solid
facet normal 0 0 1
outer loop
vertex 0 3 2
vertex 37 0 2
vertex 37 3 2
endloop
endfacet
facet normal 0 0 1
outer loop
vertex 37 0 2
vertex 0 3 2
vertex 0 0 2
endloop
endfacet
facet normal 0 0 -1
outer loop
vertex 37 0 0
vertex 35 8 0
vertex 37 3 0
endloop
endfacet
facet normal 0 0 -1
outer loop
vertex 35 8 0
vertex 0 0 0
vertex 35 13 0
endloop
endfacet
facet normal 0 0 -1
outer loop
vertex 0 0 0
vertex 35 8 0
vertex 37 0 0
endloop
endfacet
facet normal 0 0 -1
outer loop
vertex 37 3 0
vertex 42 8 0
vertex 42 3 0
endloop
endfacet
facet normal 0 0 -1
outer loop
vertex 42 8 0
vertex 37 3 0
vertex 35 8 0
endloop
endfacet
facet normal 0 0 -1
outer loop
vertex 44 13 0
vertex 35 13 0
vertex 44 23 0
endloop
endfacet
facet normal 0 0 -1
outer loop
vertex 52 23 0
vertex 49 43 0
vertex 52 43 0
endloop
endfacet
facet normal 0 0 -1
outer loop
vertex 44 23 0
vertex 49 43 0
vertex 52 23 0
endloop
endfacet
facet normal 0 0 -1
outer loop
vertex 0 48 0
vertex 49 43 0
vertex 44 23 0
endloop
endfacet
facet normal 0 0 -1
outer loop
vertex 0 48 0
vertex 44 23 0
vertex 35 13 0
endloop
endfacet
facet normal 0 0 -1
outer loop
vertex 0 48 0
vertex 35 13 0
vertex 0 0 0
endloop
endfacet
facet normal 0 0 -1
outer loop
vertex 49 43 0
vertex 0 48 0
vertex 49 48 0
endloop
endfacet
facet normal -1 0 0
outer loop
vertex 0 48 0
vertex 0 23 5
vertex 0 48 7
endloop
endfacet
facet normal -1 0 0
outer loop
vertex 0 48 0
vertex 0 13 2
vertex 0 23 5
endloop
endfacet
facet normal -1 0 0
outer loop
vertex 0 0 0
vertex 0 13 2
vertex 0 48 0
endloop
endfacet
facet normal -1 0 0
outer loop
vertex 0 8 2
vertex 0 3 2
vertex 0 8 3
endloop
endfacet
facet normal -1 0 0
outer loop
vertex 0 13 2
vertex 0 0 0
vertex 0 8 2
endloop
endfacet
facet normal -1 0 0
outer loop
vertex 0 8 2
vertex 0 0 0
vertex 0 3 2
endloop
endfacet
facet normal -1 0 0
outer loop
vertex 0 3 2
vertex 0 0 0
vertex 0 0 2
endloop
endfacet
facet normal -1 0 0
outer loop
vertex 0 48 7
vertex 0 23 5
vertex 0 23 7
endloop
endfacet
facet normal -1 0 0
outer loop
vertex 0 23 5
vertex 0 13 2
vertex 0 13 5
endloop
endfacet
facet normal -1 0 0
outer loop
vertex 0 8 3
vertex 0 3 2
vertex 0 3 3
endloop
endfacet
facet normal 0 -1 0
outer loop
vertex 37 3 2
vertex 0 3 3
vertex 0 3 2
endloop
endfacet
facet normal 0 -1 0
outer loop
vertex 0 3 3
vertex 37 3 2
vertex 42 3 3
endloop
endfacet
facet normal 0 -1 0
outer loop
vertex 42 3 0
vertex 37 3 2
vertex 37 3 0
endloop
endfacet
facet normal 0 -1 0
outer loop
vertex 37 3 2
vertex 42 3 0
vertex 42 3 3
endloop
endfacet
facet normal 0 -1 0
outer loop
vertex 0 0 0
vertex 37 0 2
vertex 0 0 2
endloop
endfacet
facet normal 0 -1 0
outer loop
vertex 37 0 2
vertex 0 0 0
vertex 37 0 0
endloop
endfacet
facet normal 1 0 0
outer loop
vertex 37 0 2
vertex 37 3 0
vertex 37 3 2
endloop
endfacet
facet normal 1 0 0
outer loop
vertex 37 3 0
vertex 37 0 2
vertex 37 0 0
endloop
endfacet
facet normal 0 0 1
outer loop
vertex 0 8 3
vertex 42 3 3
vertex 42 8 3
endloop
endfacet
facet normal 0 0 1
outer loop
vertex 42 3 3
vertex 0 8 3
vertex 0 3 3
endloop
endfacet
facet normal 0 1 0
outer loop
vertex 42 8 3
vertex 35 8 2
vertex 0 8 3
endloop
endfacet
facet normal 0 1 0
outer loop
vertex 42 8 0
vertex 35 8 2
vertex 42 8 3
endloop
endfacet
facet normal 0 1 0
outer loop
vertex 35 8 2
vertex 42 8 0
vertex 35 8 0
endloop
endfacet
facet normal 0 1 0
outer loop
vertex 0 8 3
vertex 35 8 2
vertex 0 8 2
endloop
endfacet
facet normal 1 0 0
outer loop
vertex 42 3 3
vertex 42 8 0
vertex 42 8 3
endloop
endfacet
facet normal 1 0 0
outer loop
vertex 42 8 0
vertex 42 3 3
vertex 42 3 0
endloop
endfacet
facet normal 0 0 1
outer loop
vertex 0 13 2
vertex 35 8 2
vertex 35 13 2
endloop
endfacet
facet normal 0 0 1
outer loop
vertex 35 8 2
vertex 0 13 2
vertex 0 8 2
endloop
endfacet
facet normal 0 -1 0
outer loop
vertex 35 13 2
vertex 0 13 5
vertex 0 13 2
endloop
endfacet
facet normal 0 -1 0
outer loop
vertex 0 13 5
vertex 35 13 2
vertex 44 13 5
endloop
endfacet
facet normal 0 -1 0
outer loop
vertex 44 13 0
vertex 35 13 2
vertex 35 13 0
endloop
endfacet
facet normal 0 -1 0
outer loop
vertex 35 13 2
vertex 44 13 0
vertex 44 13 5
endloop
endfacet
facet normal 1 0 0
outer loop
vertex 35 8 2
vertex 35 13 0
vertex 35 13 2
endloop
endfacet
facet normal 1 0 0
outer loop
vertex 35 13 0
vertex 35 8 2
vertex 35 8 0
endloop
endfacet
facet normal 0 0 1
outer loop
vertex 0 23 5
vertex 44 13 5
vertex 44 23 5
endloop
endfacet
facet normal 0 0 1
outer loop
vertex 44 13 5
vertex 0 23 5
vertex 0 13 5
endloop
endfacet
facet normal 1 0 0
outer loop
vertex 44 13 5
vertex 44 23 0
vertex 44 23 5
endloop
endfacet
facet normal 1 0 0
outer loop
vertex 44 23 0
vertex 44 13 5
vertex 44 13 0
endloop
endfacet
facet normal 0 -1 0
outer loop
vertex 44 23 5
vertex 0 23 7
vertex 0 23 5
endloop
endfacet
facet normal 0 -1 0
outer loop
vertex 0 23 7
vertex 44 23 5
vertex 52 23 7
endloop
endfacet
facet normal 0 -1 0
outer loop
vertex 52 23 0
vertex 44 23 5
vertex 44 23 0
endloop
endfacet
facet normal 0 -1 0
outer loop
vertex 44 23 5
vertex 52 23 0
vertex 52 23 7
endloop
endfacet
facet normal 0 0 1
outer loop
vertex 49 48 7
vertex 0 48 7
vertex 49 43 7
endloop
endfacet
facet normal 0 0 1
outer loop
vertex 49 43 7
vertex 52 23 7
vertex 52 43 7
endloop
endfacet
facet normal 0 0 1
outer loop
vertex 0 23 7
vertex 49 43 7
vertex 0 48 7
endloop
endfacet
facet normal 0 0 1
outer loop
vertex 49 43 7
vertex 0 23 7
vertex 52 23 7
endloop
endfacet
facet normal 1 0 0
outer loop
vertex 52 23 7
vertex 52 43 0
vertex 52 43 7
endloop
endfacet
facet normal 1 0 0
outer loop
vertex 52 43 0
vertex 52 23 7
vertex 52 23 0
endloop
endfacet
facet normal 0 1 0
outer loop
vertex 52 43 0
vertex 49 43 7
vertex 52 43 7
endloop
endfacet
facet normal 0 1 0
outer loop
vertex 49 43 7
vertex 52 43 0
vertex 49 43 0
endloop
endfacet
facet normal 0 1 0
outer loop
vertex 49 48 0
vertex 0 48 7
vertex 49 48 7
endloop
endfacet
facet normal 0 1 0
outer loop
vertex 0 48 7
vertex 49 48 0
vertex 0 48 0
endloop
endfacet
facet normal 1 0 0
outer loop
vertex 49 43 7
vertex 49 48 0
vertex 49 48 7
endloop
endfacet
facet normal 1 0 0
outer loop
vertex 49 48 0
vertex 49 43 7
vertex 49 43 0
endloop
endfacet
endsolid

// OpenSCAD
translate([2.5, 1.5, 1.0]) color([0.9694854220936419, 0.7136168898793864, 0.2963863893491513]) cube([5, 3, 2], center=true);
translate([8.5, 1.5, 1.0]) color([0.8491315553121948, 0.95846907728749, 0.38764569013819994]) cube([7, 3, 2], center=true);
translate([14.5, 1.5, 1.0]) color([0.29380353478258403, 0.7457841029207014, 0.9575468650535228]) cube([5, 3, 2], center=true);
translate([19.5, 1.5, 1.0]) color([0.98339807845839, 0.12155240415787172, 0.8604321836344089]) cube([5, 3, 2], center=true);
translate([24.5, 1.5, 1.0]) color([0.9958411320233901, 0.03818441020037311, 0.39202639046743215]) cube([5, 3, 2], center=true);
translate([29.5, 1.5, 1.0]) color([0.3715816420064585, 0.19047756087385292, 0.3565538137373233]) cube([5, 3, 2], center=true);
translate([34.5, 1.5, 1.0]) color([0.6320134108911423, 0.9564975354421206, 0.901927522825372]) cube([5, 3, 2], center=true);
translate([3.5, 5.5, 1.5]) color([0.039980675922074105, 0.2553863294502452, 0.02665600139486224]) cube([7, 5, 3], center=true);
translate([10.5, 5.5, 1.5]) color([0.5200631817170318, 0.5692567569896342, 0.8758772851227178]) cube([7, 5, 3], center=true);
translate([17.5, 5.5, 1.5]) color([0.2296552367022351, 0.7763426439418957, 0.8846860519705121]) cube([7, 5, 3], center=true);
translate([24.5, 5.5, 1.5]) color([0.6274277551427163, 0.5024128608294012, 0.5237115354844265]) cube([7, 5, 3], center=true);
translate([31.5, 5.5, 1.5]) color([0.5071067236759631, 0.9454855480301745, 0.14569042195357562]) cube([7, 5, 3], center=true);
translate([38.5, 5.5, 1.5]) color([0.8918421087116969, 0.42205651792049836, 0.08403205823715598]) cube([7, 5, 3], center=true);
translate([2.5, 10.5, 1.0]) color([0.1047646210762947, 0.06292282863863541, 0.4151614515022839]) cube([5, 5, 2], center=true);
translate([7.5, 10.5, 1.0]) color([0.15615697007089357, 0.9545538427732947, 0.7913428503775491]) cube([5, 5, 2], center=true);
translate([12.5, 10.5, 1.0]) color([0.43108631436838285, 0.41701950900356644, 0.4966247746294912]) cube([5, 5, 2], center=true);
translate([17.5, 10.5, 1.0]) color([0.86405767472269, 0.32449912818180593, 0.25258592574699623]) cube([5, 5, 2], center=true);
translate([22.5, 10.5, 1.0]) color([0.35250302456564797, 0.12137799977699892, 0.691775150815975]) cube([5, 5, 2], center=true);
translate([27.5, 10.5, 1.0]) color([0.34544510653523897, 0.17790766067776254, 0.830270051764872]) cube([5, 5, 2], center=true);
translate([32.5, 10.5, 1.0]) color([0.23049353673314077, 0.3658024748453319, 0.5965890354919068]) cube([5, 5, 2], center=true);
translate([5.5, 15.5, 2.5]) color([0.14329113966210216, 0.003232100641658797, 0.6590184917581017]) cube([11, 5, 5], center=true);
translate([16.5, 15.5, 2.5]) color([0.7321014772226084, 0.9009039411186286, 0.7479768172441763]) cube([11, 5, 5], center=true);
translate([27.5, 15.5, 2.5]) color([0.29326295382626455, 0.6894664766240866, 0.932788033819558]) cube([11, 5, 5], center=true);
translate([38.5, 15.5, 2.5]) color([0.23286310478430694, 0.14188743522012004, 0.4540480681686925]) cube([11, 5, 5], center=true);
translate([5.5, 20.5, 2.5]) color([0.4766939084563374, 0.7074804824528956, 0.2582188407343454]) cube([11, 5, 5], center=true);
translate([16.5, 20.5, 2.5]) color([0.027936242271358158, 0.20812012525081536, 0.33501316214628807]) cube([11, 5, 5], center=true);
translate([27.5, 20.5, 2.5]) color([0.9609071038114427, 0.29634664160852753, 0.8784103092413238]) cube([11, 5, 5], center=true);
translate([38.5, 20.5, 2.5]) color([0.5532045188241876, 0.32698413866792275, 0.5930193960141523]) cube([11, 5, 5], center=true);
translate([6.5, 25.5, 3.5]) color([0.08080901281968078, 0.5332278801564081, 0.30776249733867533]) cube([13, 5, 7], center=true);
translate([19.5, 25.5, 3.5]) color([0.3765889324074634, 0.14692685712634312, 0.1252359956830017]) cube([13, 5, 7], center=true);
translate([32.5, 25.5, 3.5]) color([0.2228174233130471, 0.5083324480268261, 0.23665719296677712]) cube([13, 5, 7], center=true);
translate([45.5, 25.5, 3.5]) color([0.18394442119493715, 0.3724619255943996, 0.6631955135334705]) cube([13, 5, 7], center=true);
translate([6.5, 30.5, 3.5]) color([0.8609746033864751, 0.6012082175951422, 0.3938011681878649]) cube([13, 5, 7], center=true);
translate([19.5, 30.5, 3.5]) color([0.7021695231885549, 0.13202027544551864, 0.29938666187805807]) cube([13, 5, 7], center=true);
translate([32.5, 30.5, 3.5]) color([0.4167493264442593, 0.9263964007964989, 0.5910765187605377]) cube([13, 5, 7], center=true);
translate([45.5, 30.5, 3.5]) color([0.2980281087530109, 0.35456411603507165, 0.24805850121983253]) cube([13, 5, 7], center=true);
translate([6.5, 35.5, 3.5]) color([0.6327789974902275, 0.6370445113549524, 0.5292072971005523]) cube([13, 5, 7], center=true);
translate([19.5, 35.5, 3.5]) color([0.376431751315491, 0.008427608141492793, 0.9619565585865117]) cube([13, 5, 7], center=true);
translate([32.5, 35.5, 3.5]) color([0.901262330417864, 0.44129738363616366, 0.3715965769686672]) cube([13, 5, 7], center=true);
translate([45.5, 35.5, 3.5]) color([0.9523409342086877, 0.09105648808381206, 0.18545820412424963]) cube([13, 5, 7], center=true);
translate([6.5, 40.5, 3.5]) color([0.10861526636012075, 0.11215874223546374, 0.6055458611860893]) cube([13, 5, 7], center=true);
translate([19.5, 40.5, 3.5]) color([0.15387883630139487, 0.7025980908137885, 0.928268212070889]) cube([13, 5, 7], center=true);
translate([32.5, 40.5, 3.5]) color([0.18538068806857422, 0.42170431041506296, 0.1747372019883816]) cube([13, 5, 7], center=true);
translate([45.5, 40.5, 3.5]) color([0.9595322940755414, 0.3403879026852894, 0.5233486454380116]) cube([13, 5, 7], center=true);
translate([3.5, 45.5, 3.5]) color([0.35536744790103547, 0.6315169232882821, 0.08649939658707362]) cube([7, 5, 7], center=true);
translate([10.5, 45.5, 3.5]) color([0.7550350740823142, 0.2947283238309857, 0.8301737658604361]) cube([7, 5, 7], center=true);
translate([17.5, 45.5, 3.5]) color([0.4490883769000732, 0.4620108455998946, 0.2187341846418389]) cube([7, 5, 7], center=true);
translate([24.5, 45.5, 3.5]) color([0.11445722556586746, 0.9788025142917065, 0.3011589686960586]) cube([7, 5, 7], center=true);
translate([31.5, 45.5, 3.5]) color([0.6091605287508749, 0.4242090709976407, 0.7513524999576429]) cube([7, 5, 7], center=true);
translate([38.5, 45.5, 3.5]) color([0.09255304692818778, 0.4976795968420046, 0.9609180855182016]) cube([7, 5, 7], center=true);
translate([45.5, 45.5, 3.5]) color([0.5437408220916614, 0.405305104554358, 0.6320656015278037]) cube([7, 5, 7], center=true);
